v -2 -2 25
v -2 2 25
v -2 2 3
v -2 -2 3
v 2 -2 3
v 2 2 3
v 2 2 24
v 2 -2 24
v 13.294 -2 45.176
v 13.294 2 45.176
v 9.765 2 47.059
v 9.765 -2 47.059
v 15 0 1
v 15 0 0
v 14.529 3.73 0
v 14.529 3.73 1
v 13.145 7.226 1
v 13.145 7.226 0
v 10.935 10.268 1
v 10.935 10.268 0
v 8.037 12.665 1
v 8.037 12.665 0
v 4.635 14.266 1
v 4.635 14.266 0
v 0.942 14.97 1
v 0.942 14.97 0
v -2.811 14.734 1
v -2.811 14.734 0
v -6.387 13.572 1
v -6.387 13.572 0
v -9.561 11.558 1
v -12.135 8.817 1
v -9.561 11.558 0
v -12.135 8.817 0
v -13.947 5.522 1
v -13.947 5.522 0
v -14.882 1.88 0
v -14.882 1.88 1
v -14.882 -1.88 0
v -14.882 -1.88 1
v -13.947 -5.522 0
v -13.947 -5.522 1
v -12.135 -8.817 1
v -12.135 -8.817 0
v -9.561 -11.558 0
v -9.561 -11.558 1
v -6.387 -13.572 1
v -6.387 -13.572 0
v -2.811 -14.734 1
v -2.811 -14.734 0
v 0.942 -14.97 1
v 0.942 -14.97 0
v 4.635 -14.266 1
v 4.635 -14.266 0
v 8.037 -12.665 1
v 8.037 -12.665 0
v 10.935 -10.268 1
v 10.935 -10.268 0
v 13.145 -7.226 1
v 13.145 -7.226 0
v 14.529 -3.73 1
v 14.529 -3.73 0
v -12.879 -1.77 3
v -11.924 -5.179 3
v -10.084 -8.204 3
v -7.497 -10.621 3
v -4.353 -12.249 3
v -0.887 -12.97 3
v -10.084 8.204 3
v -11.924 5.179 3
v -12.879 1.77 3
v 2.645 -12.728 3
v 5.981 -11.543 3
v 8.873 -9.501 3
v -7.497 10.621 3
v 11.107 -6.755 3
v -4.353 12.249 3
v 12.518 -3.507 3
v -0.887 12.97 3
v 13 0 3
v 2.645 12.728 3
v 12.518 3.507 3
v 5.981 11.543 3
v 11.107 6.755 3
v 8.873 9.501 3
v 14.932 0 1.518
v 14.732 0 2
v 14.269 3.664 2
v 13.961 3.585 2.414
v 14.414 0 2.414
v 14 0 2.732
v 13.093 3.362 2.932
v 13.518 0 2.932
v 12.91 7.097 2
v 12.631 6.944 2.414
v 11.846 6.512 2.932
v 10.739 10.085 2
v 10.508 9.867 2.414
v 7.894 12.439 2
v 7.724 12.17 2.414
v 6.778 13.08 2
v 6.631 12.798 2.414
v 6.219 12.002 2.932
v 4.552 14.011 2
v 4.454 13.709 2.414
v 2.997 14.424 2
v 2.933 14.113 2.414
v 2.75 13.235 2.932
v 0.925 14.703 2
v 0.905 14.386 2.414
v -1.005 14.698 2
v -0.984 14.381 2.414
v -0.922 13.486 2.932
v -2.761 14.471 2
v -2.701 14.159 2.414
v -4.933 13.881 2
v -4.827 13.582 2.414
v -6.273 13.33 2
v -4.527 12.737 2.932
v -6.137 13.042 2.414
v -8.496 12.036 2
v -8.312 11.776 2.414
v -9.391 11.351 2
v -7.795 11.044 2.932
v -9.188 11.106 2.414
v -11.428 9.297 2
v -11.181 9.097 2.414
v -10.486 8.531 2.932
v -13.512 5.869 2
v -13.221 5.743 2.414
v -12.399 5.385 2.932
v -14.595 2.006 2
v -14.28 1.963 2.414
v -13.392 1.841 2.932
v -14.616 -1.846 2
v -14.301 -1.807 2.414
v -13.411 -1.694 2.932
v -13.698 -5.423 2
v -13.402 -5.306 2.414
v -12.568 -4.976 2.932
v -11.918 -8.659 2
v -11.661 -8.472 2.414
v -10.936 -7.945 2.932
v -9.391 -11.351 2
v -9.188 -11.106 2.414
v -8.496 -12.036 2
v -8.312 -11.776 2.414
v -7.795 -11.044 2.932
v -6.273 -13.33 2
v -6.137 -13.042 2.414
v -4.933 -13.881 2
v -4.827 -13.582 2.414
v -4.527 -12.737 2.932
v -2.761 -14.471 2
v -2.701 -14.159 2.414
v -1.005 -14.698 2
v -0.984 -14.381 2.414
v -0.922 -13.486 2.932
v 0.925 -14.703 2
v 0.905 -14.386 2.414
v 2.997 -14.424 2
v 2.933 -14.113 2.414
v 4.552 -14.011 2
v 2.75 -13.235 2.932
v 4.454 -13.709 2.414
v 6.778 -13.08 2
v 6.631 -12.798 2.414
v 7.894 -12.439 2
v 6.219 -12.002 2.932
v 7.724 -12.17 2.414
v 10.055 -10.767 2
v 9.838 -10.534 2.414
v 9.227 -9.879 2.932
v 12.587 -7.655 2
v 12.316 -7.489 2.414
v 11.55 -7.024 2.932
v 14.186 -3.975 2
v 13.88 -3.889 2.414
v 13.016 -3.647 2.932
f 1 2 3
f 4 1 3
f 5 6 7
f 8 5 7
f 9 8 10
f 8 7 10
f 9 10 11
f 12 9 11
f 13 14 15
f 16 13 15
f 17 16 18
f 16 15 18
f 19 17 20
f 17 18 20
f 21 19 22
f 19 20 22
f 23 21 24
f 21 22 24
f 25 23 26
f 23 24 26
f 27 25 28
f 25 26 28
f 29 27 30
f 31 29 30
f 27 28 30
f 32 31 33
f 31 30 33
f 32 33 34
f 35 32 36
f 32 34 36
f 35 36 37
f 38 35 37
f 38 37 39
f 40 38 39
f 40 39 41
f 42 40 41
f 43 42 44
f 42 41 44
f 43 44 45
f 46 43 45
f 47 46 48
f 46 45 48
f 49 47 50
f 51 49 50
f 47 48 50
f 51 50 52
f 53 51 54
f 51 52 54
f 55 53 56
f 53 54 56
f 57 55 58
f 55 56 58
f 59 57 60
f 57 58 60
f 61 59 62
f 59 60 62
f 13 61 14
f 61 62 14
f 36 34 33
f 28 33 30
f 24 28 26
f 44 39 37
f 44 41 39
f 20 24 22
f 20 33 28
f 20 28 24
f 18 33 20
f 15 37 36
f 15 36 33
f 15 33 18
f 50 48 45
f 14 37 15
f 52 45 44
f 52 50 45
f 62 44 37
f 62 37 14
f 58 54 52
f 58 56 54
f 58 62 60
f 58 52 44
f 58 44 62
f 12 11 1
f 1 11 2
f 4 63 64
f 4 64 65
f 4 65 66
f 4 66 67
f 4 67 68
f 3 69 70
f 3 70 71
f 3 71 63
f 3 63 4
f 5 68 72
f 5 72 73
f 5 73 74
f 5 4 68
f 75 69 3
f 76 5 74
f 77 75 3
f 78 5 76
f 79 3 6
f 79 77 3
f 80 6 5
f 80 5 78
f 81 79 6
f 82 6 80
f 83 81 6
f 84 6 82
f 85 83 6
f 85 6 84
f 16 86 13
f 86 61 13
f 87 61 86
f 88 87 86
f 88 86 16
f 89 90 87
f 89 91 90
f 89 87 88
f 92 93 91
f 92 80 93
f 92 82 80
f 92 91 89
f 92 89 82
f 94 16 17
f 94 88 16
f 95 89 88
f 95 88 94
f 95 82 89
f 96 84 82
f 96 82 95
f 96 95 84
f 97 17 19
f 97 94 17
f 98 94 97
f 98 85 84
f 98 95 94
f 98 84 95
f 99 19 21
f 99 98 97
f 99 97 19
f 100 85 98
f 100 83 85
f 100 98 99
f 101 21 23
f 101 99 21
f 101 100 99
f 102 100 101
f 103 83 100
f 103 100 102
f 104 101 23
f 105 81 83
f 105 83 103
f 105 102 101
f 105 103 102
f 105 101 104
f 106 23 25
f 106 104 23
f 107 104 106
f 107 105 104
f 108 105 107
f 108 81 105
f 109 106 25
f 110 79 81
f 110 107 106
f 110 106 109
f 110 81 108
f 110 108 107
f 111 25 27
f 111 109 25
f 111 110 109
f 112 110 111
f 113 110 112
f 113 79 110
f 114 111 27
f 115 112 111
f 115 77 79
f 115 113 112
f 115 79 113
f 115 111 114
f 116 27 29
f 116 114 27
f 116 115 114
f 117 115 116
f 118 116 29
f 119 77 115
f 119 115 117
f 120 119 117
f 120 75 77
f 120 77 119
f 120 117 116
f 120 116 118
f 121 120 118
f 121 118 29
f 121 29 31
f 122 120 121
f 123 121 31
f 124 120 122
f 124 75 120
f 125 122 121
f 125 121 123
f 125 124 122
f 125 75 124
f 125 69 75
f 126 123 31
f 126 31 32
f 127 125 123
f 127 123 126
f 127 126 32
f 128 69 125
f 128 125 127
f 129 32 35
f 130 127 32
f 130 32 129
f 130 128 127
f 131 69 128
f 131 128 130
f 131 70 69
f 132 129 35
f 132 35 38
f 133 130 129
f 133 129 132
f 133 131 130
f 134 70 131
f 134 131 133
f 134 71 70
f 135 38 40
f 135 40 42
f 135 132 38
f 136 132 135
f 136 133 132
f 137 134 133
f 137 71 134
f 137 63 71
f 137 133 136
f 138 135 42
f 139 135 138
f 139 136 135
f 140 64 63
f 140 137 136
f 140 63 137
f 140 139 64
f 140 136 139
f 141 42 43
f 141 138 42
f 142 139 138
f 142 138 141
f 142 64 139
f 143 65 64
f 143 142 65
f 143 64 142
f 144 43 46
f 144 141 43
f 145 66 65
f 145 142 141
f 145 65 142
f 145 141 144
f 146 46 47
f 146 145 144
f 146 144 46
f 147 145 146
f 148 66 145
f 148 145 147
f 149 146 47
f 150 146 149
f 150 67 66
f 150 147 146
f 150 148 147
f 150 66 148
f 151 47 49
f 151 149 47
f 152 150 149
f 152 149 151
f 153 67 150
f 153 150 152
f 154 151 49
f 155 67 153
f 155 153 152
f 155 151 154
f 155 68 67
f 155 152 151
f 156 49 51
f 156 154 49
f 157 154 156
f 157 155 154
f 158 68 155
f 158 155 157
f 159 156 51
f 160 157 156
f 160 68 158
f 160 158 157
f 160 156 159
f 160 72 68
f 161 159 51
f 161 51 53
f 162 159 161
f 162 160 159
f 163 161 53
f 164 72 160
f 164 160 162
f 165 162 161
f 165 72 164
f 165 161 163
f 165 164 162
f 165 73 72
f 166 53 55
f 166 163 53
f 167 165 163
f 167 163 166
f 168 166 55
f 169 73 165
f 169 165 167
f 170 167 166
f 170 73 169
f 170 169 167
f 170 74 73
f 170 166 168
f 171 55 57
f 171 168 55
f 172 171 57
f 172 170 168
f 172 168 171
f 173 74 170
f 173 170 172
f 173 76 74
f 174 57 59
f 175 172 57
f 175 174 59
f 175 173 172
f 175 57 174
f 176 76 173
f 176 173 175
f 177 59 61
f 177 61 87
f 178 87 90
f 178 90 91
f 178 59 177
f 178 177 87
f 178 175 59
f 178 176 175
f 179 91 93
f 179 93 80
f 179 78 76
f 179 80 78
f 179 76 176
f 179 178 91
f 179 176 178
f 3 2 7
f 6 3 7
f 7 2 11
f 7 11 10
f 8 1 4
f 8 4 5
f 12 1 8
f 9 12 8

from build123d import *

# Parameters (mm, degrees)
SKETCH008_R       = 15
PAD004_DEPTH      = 3
PAD005_DEPTH      = 2
PAD005_DEPTH_BACK = 2
FILLET_R          = 2


with BuildPart() as part:
    # Sketch008 → Pad004 (new body)
    with BuildSketch(Plane.XY):
        Circle(SKETCH008_R)
    extrude(amount=PAD004_DEPTH)

    # Sketch009 → Pad005 (join, two sides)
    with BuildSketch(Plane.XZ) as pad005_sk:
        Polygon((-2, 0), (2, 0), (2, 24), (13.294118, 45.176471), (9.764706, 47.058824), (-2, 25), align=None)
    extrude(amount=PAD005_DEPTH)
    extrude(pad005_sk.sketch, amount=-PAD005_DEPTH_BACK)

    # Fillet
    fillet_edges = [part.edges().sort_by_distance(p)[0] for p in [
        (-15, 0, 3),
    ]]
    fillet(fillet_edges, radius=FILLET_R)


solid = part.part
